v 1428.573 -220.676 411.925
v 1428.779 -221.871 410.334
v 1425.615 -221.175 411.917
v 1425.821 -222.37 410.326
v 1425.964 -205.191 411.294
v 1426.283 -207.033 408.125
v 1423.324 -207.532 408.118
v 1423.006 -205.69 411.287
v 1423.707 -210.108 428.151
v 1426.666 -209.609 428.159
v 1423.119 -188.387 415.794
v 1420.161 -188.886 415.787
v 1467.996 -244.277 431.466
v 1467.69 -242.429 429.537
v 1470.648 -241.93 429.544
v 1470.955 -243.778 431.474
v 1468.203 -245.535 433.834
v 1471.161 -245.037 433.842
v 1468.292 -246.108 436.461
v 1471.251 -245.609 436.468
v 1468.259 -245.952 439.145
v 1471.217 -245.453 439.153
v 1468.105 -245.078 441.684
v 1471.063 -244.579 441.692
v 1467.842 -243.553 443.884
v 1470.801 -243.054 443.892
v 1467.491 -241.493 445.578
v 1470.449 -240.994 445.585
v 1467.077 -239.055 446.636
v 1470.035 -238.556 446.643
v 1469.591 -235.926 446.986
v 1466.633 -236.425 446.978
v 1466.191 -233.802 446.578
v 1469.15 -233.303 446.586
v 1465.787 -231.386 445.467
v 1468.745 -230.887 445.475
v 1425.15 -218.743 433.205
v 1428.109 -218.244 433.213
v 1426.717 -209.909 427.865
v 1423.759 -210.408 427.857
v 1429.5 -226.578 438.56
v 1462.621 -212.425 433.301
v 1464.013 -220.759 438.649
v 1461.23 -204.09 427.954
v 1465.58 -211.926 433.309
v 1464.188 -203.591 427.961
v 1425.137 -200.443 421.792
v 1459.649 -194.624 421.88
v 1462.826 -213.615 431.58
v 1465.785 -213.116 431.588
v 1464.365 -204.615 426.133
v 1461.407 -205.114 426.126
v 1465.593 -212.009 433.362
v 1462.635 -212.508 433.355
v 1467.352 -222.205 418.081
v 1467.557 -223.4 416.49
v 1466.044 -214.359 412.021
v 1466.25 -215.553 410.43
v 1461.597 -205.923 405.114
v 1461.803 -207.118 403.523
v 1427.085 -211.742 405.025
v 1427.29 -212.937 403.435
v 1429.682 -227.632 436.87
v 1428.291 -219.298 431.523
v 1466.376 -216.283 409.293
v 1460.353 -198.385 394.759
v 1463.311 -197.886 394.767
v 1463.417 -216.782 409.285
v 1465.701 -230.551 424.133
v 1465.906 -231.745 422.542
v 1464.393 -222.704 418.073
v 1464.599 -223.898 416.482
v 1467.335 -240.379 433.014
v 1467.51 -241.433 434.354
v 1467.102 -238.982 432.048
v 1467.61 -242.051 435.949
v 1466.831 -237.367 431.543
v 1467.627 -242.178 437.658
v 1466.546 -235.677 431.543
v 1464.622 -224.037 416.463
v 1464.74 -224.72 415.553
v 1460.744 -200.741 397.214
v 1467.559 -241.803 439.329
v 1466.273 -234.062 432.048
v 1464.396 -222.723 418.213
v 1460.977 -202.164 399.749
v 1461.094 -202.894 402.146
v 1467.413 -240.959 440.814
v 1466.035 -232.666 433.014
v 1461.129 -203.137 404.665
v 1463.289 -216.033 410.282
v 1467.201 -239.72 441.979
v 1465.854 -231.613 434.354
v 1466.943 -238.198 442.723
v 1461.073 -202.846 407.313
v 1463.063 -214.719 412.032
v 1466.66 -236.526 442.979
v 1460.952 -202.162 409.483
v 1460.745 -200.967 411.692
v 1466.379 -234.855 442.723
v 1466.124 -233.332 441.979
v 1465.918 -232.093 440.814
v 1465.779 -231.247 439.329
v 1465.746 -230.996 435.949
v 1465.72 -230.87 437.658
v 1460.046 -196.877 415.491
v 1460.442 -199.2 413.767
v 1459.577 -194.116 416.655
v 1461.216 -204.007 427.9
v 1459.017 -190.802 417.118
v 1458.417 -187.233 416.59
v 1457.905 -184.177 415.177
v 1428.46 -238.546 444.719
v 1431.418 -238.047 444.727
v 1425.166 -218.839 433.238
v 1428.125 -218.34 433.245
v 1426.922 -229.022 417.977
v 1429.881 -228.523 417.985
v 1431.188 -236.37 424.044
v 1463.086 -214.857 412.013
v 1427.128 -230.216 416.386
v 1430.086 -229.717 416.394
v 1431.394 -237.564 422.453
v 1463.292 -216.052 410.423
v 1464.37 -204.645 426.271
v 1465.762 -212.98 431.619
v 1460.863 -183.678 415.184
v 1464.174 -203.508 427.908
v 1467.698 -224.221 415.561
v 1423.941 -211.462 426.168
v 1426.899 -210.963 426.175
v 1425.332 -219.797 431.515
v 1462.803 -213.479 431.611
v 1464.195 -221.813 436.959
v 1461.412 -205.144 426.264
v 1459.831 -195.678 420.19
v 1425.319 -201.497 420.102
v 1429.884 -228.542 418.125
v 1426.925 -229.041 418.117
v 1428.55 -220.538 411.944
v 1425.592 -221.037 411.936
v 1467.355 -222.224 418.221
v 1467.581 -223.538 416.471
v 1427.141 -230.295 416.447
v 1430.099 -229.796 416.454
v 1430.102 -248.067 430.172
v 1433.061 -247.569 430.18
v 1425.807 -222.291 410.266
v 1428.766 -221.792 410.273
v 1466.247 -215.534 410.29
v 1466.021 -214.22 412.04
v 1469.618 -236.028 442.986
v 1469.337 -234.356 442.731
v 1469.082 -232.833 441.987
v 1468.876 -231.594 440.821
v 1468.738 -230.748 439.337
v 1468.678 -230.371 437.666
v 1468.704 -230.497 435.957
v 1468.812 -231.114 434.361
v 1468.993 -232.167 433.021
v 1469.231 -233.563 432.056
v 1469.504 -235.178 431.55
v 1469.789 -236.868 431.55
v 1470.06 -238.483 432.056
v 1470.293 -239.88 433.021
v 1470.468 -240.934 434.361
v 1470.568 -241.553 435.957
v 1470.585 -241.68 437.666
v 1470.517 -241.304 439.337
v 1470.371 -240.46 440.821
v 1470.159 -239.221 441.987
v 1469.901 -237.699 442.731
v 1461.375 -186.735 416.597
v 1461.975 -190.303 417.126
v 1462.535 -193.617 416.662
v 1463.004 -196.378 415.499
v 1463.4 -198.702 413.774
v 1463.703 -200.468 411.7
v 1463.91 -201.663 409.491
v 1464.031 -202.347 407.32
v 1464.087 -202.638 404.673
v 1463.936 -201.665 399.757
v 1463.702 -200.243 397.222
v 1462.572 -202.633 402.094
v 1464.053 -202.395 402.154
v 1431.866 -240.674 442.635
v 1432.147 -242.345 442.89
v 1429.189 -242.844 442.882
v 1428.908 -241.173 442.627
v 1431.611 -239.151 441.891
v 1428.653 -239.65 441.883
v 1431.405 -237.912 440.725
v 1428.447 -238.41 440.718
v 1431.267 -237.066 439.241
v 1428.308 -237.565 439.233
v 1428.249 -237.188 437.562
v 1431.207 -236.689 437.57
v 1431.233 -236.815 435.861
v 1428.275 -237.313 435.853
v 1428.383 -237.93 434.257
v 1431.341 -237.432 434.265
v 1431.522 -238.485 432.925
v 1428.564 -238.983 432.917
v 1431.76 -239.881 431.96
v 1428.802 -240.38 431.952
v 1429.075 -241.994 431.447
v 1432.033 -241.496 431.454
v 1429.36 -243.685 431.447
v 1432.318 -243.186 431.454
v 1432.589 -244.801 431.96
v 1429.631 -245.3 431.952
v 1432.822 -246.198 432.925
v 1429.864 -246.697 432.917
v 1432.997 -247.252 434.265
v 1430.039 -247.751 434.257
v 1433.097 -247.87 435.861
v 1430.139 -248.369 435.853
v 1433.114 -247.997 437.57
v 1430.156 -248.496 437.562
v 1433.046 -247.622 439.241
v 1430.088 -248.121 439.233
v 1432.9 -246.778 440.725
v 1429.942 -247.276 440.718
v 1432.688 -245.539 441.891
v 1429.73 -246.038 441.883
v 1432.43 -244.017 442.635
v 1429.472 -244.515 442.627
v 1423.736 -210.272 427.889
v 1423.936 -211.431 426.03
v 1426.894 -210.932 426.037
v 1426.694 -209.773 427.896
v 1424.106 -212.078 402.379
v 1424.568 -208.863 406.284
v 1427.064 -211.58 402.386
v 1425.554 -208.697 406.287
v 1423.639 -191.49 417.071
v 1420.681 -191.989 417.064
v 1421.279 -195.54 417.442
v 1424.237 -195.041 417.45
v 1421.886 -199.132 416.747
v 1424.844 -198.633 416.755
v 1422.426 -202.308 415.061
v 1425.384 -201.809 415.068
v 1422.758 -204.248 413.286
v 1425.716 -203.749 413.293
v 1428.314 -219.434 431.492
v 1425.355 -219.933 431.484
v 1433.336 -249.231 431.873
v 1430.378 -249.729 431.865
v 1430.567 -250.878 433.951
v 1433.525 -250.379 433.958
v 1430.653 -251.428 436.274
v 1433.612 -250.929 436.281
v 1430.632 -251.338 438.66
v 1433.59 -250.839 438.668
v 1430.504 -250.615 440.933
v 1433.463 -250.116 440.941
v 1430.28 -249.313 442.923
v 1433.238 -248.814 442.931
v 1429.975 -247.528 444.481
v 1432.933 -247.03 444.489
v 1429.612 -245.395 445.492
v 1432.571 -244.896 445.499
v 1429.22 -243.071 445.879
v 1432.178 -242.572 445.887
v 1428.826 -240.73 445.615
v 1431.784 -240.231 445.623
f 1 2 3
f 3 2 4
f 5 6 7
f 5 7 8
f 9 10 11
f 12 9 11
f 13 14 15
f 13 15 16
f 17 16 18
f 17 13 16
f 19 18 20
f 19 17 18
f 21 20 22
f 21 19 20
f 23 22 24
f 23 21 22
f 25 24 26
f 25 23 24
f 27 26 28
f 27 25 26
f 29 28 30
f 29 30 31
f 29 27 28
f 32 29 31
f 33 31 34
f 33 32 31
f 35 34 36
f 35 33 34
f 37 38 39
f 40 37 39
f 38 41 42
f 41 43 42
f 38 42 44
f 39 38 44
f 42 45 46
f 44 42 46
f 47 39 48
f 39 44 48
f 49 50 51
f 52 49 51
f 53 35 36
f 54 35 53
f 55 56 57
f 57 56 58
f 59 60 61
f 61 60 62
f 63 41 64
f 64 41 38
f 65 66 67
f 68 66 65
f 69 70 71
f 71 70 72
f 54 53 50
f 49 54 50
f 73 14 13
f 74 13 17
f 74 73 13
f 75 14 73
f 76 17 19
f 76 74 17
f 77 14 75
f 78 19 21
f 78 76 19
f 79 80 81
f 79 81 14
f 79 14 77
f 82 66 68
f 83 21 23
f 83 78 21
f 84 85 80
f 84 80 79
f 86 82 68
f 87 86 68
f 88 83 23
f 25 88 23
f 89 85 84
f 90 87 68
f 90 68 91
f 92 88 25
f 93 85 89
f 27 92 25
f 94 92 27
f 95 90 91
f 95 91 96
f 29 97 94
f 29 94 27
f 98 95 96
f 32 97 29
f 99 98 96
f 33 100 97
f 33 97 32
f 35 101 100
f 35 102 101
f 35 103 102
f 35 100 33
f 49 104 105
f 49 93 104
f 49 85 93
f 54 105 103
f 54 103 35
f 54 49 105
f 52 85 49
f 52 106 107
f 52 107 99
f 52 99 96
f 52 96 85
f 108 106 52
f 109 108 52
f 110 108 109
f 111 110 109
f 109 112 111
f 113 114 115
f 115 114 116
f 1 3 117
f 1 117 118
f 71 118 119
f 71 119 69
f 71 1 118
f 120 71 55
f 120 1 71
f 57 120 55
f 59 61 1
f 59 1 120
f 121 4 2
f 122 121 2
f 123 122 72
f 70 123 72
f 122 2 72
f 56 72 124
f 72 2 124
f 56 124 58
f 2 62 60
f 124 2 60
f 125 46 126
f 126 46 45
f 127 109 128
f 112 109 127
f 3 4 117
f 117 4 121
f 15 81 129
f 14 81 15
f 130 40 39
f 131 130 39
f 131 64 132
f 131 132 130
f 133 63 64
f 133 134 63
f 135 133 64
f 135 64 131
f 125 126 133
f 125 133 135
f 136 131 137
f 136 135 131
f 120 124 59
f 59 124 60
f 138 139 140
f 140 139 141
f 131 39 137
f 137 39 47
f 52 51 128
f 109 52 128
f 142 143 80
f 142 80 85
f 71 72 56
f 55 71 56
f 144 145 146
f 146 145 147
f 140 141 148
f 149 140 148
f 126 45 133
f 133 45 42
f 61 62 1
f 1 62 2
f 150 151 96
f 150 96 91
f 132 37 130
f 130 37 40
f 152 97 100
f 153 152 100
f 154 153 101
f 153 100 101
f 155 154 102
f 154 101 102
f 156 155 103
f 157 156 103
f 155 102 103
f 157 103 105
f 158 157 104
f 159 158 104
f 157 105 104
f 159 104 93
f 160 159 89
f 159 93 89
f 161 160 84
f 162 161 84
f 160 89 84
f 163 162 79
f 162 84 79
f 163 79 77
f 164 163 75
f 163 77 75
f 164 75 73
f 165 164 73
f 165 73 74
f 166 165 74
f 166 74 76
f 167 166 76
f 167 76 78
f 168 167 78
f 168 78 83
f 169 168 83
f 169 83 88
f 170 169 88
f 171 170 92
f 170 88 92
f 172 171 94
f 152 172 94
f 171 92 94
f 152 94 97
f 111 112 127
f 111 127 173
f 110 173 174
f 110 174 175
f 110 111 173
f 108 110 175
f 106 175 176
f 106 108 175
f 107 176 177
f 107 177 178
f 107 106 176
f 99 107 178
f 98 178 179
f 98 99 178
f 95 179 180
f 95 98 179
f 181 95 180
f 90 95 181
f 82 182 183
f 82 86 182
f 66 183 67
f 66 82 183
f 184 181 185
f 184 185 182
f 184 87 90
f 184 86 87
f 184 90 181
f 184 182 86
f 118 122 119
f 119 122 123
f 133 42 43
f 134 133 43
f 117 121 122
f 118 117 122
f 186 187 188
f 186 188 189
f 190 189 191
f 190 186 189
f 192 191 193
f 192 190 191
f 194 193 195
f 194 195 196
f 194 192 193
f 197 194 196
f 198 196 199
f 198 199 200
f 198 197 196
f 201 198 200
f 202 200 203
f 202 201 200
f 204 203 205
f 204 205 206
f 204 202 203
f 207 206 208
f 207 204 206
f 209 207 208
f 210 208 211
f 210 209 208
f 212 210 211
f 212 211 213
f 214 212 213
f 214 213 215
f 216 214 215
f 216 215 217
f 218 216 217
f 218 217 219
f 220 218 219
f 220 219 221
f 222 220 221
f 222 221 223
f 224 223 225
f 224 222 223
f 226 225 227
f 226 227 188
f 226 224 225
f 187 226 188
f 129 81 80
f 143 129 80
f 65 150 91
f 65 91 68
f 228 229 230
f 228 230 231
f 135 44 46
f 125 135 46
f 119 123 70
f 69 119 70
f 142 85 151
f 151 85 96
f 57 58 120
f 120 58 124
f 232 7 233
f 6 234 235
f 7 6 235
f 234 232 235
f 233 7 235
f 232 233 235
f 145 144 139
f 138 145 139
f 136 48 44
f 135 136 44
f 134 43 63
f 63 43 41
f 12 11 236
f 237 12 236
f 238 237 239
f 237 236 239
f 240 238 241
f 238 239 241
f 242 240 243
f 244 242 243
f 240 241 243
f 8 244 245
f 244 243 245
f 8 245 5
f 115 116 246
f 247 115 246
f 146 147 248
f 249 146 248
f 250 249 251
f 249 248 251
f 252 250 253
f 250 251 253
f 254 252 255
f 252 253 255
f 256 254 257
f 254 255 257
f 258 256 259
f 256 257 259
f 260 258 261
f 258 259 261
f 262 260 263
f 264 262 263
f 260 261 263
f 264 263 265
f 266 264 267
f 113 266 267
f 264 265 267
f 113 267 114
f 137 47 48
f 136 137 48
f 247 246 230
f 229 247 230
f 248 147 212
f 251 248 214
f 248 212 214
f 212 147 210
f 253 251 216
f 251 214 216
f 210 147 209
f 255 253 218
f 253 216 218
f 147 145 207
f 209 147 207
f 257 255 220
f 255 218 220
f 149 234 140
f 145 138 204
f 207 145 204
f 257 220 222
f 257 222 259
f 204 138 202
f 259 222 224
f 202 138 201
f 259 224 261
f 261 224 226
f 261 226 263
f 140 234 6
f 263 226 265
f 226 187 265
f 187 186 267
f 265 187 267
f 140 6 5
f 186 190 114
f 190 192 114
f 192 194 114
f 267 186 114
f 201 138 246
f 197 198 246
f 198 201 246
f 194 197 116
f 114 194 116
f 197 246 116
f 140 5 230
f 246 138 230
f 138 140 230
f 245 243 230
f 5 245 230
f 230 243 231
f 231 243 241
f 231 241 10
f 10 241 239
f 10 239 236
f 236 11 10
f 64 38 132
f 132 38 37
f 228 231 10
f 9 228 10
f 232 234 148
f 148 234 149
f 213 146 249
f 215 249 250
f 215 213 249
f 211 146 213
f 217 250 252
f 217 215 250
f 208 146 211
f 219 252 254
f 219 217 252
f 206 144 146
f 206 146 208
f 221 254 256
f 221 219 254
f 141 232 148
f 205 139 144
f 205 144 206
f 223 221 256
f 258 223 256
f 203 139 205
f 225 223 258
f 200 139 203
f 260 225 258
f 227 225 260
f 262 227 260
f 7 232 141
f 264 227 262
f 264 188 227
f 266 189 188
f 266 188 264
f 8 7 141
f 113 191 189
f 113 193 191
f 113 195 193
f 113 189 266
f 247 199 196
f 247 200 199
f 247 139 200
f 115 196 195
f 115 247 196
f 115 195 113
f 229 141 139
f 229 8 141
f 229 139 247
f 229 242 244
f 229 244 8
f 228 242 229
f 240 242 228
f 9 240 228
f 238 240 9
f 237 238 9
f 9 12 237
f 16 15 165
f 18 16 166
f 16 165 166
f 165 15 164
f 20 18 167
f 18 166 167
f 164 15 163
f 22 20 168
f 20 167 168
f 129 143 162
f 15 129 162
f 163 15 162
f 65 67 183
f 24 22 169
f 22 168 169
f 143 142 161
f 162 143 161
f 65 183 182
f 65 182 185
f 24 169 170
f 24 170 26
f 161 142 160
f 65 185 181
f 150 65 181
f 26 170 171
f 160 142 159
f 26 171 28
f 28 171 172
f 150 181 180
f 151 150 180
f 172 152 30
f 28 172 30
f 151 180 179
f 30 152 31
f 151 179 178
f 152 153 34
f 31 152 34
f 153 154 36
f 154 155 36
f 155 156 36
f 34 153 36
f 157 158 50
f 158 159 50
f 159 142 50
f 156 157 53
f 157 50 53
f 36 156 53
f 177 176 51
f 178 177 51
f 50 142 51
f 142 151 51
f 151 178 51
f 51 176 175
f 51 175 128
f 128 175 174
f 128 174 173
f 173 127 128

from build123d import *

# Parameters (mm, degrees)
SZKIC1_R                    = 5.75
DODANIE_WYCI_GNI_CIE1_DEPTH = 3
WYTNIJ_WYCI_GNI_CIE2_DEPTH  = 4
SZKIC3_R                    = 5.75
DODANIE_WYCI_GNI_CIE2_DEPTH = 3
DODANIE_WYCI_GNI_CIE3_DEPTH = 2
WYTNIJ_WYCI_GNI_CIE5_DEPTH  = 52.458233786
DODANIE_WYCI_GNI_CIE4_DEPTH = 2
WYTNIJ_WYCI_GNI_CIE6_DEPTH  = 52.326394369


with BuildPart() as part:
    # Szkic1 → Dodanie-wyciągnięcie1 (new body)
    with BuildSketch(Plane(origin=(1353.926196645, 228.277019177, 3.474323827), x_dir=(-0.002495171, -0.000420695, 0.999996799), z_dir=(-0.986079268, -0.166256652, -0.002530388))):
        with BuildLine():
            Line((441.253729445, -472.717830488), (412.321307972, -422.369080805))
            add(Edge.make_bspline(
                [(412.321307972, -422.369080805), (419.534612329, -434.921810131), (409.382942082, -443.035336139), (398.958819921, -440.887627989), (396.244969441, -440.328486537), (393.549490929, -438.853317877), (391.545812295, -436.223029822)],
                knots=[0.155088839, 0.155088839, 0.155088839, 0.155088839, 0.5, 0.5, 0.5, 0.636085355, 0.636085355, 0.636085355, 0.636085355], degree=3, weights=[0.572065028, 0.397473461, 0.540118452, 1, 0.818552861, 0.686490318, 0.603812372]))
            Line((391.545812295, -436.223029822), (426.706645918, -482.379693415))
            ThreePointArc((426.706645918, -482.379693415), (438.50818535, -484.366200864), (441.253729445, -472.717830488))
        make_face()
        with Locations((433.667120391, -477.077401919)):
            Circle(SZKIC1_R, mode=Mode.SUBTRACT)
    extrude(amount=DODANIE_WYCI_GNI_CIE1_DEPTH)

    # Szkic2 → Wytnij-wyciągnięcie2 (cut)
    with BuildSketch(Plane(origin=(1353.926196645, 228.277019177, 3.474323827), x_dir=(-0.002495171, -0.000420695, 0.999996799), z_dir=(-0.986079268, -0.166256652, -0.002530388))):
        with BuildLine():
            Line((404.65211173, -441.281083771), (407.821394229, -439.412393836))
            add(Edge.make_bspline(
                [(407.821394229, -439.412393836), (404.88822276, -441.141866675), (401.74377418, -441.461419131), (398.958819921, -440.887627989), (396.244969441, -440.328486537), (393.549490929, -438.853317877), (391.545812295, -436.223029822)],
                knots=[0.36100992, 0.36100992, 0.36100992, 0.36100992, 0.5, 0.5, 0.5, 0.636085355, 0.636085355, 0.636085355, 0.636085355], degree=3, weights=[0.598585618, 0.680875099, 0.814679893, 1, 0.818552861, 0.686490318, 0.603812372]))
            Line((391.545812295, -436.223029822), (398.913248998, -445.894481333))
            add(Edge.make_bspline(
                [(404.65211173, -441.281083771), (402.813382058, -442.825248985), (400.897379873, -444.366955046), (398.913248998, -445.894481333)],
                knots=[0, 0, 0, 0, 0.049966966, 0.049966966, 0.049966966, 0.049966966], degree=3, weights=[1, 0.976581917, 0.955504095, 0.936766535]))
        make_face()
    extrude(amount=WYTNIJ_WYCI_GNI_CIE2_DEPTH, mode=Mode.SUBTRACT)


with BuildPart() as body_2:
    # Szkic3 → Dodanie-wyciągnięcie2 (new body)
    with BuildSketch(Plane(origin=(1388.438971028, 234.096001984, 3.562887409), x_dir=(-0.002495171, -0.000420695, 0.999996799), z_dir=(-0.986079268, -0.166256652, -0.002530388))):
        with BuildLine():
            ThreePointArc((425.97506823, -483.068631638), (439.276403639, -485.052265017), (441.905846435, -471.8633926))
            Line((441.905846435, -471.8633926), (411.615109292, -424.000592643))
            add(Edge.make_bspline(
                [(411.615109292, -424.000592643), (419.595034213, -436.609779022), (409.302289126, -445.196085213), (398.528479374, -442.976330047), (395.854111239, -442.425323243), (393.195756664, -440.983753213), (391.197443428, -438.418148092)],
                knots=[0.148934404, 0.148934404, 0.148934404, 0.148934404, 0.5, 0.5, 0.5, 0.634460468, 0.634460468, 0.634460468, 0.634460468], degree=3, weights=[0.581714038, 0.392483884, 0.531912538, 1, 0.820719376, 0.689651066, 0.606795068]))
            Line((391.197443428, -438.418148092), (425.97506823, -483.068631638))
        make_face()
        with Locations((433.667120391, -477.077401919)):
            Circle(SZKIC3_R, mode=Mode.SUBTRACT)
    extrude(amount=-DODANIE_WYCI_GNI_CIE2_DEPTH)


with BuildPart() as body_3:
    # Szkic5 → Dodanie-wyciągnięcie3 (new body)
    with BuildSketch(Plane(origin=(-11.019604992, 63.800963274, 102.304268594), x_dir=(-0.139152569, 0.833462201, -0.534768474), z_dir=(0.091017799, -0.526971996, -0.844994838))):
        Polygon((-622.291479281, 1373.039917254), (-612.291479281, 1373.039917254), (-612.291479281, 1370.039917254), (-602.291479281, 1370.039917254), (-602.291479281, 1373.039917254), (-590.934128354, 1373.039917254), (-590.934128354, 1408.039917254), (-602.291479281, 1408.039917254), (-602.291479281, 1411.039917254), (-612.291479281, 1411.039917254), (-612.291479281, 1408.039917254), (-622.291479281, 1408.039917254), align=None)
    extrude(amount=DODANIE_WYCI_GNI_CIE3_DEPTH)


with BuildPart() as wytnij_wyci_gni_cie5_tool:
    # Szkic6 → Wytnij-wyciągnięcie5 (new body, through all)
    with BuildSketch(Plane(origin=(1391.397208832, 234.594771939, 3.570478573), x_dir=(0.002495171, 0.000420695, -0.999996799), z_dir=(0.986079268, 0.166256652, 0.002530388))):
        Polygon((-429.877801464, -452.670721233), (-428.01880687, -453.847215644), (-422.564150967, -445.228240705), (-424.423145562, -444.051746295), (-425.099143596, -443.623930146), (-430.553799499, -452.242905084), align=None)
    extrude(amount=-WYTNIJ_WYCI_GNI_CIE5_DEPTH)


with BuildPart() as body_2_1:
    add(body_2.part)

    # Wytnij-wyciągnięcie5: cut by wytnij_wyci_gni_cie5_tool
    add(wytnij_wyci_gni_cie5_tool.part, mode=Mode.SUBTRACT)


with BuildPart() as part_1:
    add(part.part)

    # Wytnij-wyciągnięcie5: cut by wytnij_wyci_gni_cie5_tool
    add(wytnij_wyci_gni_cie5_tool.part, mode=Mode.SUBTRACT)


with BuildPart() as body_4:
    # Szkic8 → Dodanie-wyciągnięcie4 (new body)
    with BuildSketch(Plane(origin=(-4.841506853, 28.144729202, 37.488754103), x_dir=(-0.994708897, -0.061327404, -0.082420631), z_dir=(0.102732757, -0.597207796, -0.79548025))):
        Polygon((-1476.126488844, -418.541211572), (-1474.62501424, -407.254986635), (-1439.930687938, -411.870582206), (-1441.432162542, -423.156807143), (-1438.458363145, -423.55242962), (-1439.777104737, -433.465094278), (-1442.750904134, -433.0694718), (-1444.069645726, -442.982136458), (-1478.763972027, -438.366540887), (-1477.445230435, -428.453876229), (-1480.419029833, -428.058253752), (-1479.100288241, -418.145589094), align=None)
    extrude(amount=-DODANIE_WYCI_GNI_CIE4_DEPTH)


with BuildPart() as wytnij_wyci_gni_cie6_tool:
    # Szkic9 → Wytnij-wyciągnięcie6 (new body, through all)
    with BuildSketch(Plane(origin=(1350.967958841, 227.778249223, 3.466732662), x_dir=(-0.002495171, -0.000420695, 0.999996799), z_dir=(-0.986079268, -0.166256652, -0.002530388))):
        Polygon((412.901737365, -464.422605683), (414.651799518, -463.089458106), (408.470842573, -454.975533578), (406.72078042, -456.308681154), (405.288911386, -457.399438262), (411.46986833, -465.513362791), align=None)
    extrude(amount=-WYTNIJ_WYCI_GNI_CIE6_DEPTH)


with BuildPart() as body_2_2:
    add(body_2_1.part)

    # Wytnij-wyciągnięcie6: cut by wytnij_wyci_gni_cie6_tool
    add(wytnij_wyci_gni_cie6_tool.part, mode=Mode.SUBTRACT)


with BuildPart() as part_2:
    add(part_1.part)

    # Wytnij-wyciągnięcie6: cut by wytnij_wyci_gni_cie6_tool
    add(wytnij_wyci_gni_cie6_tool.part, mode=Mode.SUBTRACT)


solid = Compound([body_3.part, body_4.part, body_2_2.part, part_2.part])
